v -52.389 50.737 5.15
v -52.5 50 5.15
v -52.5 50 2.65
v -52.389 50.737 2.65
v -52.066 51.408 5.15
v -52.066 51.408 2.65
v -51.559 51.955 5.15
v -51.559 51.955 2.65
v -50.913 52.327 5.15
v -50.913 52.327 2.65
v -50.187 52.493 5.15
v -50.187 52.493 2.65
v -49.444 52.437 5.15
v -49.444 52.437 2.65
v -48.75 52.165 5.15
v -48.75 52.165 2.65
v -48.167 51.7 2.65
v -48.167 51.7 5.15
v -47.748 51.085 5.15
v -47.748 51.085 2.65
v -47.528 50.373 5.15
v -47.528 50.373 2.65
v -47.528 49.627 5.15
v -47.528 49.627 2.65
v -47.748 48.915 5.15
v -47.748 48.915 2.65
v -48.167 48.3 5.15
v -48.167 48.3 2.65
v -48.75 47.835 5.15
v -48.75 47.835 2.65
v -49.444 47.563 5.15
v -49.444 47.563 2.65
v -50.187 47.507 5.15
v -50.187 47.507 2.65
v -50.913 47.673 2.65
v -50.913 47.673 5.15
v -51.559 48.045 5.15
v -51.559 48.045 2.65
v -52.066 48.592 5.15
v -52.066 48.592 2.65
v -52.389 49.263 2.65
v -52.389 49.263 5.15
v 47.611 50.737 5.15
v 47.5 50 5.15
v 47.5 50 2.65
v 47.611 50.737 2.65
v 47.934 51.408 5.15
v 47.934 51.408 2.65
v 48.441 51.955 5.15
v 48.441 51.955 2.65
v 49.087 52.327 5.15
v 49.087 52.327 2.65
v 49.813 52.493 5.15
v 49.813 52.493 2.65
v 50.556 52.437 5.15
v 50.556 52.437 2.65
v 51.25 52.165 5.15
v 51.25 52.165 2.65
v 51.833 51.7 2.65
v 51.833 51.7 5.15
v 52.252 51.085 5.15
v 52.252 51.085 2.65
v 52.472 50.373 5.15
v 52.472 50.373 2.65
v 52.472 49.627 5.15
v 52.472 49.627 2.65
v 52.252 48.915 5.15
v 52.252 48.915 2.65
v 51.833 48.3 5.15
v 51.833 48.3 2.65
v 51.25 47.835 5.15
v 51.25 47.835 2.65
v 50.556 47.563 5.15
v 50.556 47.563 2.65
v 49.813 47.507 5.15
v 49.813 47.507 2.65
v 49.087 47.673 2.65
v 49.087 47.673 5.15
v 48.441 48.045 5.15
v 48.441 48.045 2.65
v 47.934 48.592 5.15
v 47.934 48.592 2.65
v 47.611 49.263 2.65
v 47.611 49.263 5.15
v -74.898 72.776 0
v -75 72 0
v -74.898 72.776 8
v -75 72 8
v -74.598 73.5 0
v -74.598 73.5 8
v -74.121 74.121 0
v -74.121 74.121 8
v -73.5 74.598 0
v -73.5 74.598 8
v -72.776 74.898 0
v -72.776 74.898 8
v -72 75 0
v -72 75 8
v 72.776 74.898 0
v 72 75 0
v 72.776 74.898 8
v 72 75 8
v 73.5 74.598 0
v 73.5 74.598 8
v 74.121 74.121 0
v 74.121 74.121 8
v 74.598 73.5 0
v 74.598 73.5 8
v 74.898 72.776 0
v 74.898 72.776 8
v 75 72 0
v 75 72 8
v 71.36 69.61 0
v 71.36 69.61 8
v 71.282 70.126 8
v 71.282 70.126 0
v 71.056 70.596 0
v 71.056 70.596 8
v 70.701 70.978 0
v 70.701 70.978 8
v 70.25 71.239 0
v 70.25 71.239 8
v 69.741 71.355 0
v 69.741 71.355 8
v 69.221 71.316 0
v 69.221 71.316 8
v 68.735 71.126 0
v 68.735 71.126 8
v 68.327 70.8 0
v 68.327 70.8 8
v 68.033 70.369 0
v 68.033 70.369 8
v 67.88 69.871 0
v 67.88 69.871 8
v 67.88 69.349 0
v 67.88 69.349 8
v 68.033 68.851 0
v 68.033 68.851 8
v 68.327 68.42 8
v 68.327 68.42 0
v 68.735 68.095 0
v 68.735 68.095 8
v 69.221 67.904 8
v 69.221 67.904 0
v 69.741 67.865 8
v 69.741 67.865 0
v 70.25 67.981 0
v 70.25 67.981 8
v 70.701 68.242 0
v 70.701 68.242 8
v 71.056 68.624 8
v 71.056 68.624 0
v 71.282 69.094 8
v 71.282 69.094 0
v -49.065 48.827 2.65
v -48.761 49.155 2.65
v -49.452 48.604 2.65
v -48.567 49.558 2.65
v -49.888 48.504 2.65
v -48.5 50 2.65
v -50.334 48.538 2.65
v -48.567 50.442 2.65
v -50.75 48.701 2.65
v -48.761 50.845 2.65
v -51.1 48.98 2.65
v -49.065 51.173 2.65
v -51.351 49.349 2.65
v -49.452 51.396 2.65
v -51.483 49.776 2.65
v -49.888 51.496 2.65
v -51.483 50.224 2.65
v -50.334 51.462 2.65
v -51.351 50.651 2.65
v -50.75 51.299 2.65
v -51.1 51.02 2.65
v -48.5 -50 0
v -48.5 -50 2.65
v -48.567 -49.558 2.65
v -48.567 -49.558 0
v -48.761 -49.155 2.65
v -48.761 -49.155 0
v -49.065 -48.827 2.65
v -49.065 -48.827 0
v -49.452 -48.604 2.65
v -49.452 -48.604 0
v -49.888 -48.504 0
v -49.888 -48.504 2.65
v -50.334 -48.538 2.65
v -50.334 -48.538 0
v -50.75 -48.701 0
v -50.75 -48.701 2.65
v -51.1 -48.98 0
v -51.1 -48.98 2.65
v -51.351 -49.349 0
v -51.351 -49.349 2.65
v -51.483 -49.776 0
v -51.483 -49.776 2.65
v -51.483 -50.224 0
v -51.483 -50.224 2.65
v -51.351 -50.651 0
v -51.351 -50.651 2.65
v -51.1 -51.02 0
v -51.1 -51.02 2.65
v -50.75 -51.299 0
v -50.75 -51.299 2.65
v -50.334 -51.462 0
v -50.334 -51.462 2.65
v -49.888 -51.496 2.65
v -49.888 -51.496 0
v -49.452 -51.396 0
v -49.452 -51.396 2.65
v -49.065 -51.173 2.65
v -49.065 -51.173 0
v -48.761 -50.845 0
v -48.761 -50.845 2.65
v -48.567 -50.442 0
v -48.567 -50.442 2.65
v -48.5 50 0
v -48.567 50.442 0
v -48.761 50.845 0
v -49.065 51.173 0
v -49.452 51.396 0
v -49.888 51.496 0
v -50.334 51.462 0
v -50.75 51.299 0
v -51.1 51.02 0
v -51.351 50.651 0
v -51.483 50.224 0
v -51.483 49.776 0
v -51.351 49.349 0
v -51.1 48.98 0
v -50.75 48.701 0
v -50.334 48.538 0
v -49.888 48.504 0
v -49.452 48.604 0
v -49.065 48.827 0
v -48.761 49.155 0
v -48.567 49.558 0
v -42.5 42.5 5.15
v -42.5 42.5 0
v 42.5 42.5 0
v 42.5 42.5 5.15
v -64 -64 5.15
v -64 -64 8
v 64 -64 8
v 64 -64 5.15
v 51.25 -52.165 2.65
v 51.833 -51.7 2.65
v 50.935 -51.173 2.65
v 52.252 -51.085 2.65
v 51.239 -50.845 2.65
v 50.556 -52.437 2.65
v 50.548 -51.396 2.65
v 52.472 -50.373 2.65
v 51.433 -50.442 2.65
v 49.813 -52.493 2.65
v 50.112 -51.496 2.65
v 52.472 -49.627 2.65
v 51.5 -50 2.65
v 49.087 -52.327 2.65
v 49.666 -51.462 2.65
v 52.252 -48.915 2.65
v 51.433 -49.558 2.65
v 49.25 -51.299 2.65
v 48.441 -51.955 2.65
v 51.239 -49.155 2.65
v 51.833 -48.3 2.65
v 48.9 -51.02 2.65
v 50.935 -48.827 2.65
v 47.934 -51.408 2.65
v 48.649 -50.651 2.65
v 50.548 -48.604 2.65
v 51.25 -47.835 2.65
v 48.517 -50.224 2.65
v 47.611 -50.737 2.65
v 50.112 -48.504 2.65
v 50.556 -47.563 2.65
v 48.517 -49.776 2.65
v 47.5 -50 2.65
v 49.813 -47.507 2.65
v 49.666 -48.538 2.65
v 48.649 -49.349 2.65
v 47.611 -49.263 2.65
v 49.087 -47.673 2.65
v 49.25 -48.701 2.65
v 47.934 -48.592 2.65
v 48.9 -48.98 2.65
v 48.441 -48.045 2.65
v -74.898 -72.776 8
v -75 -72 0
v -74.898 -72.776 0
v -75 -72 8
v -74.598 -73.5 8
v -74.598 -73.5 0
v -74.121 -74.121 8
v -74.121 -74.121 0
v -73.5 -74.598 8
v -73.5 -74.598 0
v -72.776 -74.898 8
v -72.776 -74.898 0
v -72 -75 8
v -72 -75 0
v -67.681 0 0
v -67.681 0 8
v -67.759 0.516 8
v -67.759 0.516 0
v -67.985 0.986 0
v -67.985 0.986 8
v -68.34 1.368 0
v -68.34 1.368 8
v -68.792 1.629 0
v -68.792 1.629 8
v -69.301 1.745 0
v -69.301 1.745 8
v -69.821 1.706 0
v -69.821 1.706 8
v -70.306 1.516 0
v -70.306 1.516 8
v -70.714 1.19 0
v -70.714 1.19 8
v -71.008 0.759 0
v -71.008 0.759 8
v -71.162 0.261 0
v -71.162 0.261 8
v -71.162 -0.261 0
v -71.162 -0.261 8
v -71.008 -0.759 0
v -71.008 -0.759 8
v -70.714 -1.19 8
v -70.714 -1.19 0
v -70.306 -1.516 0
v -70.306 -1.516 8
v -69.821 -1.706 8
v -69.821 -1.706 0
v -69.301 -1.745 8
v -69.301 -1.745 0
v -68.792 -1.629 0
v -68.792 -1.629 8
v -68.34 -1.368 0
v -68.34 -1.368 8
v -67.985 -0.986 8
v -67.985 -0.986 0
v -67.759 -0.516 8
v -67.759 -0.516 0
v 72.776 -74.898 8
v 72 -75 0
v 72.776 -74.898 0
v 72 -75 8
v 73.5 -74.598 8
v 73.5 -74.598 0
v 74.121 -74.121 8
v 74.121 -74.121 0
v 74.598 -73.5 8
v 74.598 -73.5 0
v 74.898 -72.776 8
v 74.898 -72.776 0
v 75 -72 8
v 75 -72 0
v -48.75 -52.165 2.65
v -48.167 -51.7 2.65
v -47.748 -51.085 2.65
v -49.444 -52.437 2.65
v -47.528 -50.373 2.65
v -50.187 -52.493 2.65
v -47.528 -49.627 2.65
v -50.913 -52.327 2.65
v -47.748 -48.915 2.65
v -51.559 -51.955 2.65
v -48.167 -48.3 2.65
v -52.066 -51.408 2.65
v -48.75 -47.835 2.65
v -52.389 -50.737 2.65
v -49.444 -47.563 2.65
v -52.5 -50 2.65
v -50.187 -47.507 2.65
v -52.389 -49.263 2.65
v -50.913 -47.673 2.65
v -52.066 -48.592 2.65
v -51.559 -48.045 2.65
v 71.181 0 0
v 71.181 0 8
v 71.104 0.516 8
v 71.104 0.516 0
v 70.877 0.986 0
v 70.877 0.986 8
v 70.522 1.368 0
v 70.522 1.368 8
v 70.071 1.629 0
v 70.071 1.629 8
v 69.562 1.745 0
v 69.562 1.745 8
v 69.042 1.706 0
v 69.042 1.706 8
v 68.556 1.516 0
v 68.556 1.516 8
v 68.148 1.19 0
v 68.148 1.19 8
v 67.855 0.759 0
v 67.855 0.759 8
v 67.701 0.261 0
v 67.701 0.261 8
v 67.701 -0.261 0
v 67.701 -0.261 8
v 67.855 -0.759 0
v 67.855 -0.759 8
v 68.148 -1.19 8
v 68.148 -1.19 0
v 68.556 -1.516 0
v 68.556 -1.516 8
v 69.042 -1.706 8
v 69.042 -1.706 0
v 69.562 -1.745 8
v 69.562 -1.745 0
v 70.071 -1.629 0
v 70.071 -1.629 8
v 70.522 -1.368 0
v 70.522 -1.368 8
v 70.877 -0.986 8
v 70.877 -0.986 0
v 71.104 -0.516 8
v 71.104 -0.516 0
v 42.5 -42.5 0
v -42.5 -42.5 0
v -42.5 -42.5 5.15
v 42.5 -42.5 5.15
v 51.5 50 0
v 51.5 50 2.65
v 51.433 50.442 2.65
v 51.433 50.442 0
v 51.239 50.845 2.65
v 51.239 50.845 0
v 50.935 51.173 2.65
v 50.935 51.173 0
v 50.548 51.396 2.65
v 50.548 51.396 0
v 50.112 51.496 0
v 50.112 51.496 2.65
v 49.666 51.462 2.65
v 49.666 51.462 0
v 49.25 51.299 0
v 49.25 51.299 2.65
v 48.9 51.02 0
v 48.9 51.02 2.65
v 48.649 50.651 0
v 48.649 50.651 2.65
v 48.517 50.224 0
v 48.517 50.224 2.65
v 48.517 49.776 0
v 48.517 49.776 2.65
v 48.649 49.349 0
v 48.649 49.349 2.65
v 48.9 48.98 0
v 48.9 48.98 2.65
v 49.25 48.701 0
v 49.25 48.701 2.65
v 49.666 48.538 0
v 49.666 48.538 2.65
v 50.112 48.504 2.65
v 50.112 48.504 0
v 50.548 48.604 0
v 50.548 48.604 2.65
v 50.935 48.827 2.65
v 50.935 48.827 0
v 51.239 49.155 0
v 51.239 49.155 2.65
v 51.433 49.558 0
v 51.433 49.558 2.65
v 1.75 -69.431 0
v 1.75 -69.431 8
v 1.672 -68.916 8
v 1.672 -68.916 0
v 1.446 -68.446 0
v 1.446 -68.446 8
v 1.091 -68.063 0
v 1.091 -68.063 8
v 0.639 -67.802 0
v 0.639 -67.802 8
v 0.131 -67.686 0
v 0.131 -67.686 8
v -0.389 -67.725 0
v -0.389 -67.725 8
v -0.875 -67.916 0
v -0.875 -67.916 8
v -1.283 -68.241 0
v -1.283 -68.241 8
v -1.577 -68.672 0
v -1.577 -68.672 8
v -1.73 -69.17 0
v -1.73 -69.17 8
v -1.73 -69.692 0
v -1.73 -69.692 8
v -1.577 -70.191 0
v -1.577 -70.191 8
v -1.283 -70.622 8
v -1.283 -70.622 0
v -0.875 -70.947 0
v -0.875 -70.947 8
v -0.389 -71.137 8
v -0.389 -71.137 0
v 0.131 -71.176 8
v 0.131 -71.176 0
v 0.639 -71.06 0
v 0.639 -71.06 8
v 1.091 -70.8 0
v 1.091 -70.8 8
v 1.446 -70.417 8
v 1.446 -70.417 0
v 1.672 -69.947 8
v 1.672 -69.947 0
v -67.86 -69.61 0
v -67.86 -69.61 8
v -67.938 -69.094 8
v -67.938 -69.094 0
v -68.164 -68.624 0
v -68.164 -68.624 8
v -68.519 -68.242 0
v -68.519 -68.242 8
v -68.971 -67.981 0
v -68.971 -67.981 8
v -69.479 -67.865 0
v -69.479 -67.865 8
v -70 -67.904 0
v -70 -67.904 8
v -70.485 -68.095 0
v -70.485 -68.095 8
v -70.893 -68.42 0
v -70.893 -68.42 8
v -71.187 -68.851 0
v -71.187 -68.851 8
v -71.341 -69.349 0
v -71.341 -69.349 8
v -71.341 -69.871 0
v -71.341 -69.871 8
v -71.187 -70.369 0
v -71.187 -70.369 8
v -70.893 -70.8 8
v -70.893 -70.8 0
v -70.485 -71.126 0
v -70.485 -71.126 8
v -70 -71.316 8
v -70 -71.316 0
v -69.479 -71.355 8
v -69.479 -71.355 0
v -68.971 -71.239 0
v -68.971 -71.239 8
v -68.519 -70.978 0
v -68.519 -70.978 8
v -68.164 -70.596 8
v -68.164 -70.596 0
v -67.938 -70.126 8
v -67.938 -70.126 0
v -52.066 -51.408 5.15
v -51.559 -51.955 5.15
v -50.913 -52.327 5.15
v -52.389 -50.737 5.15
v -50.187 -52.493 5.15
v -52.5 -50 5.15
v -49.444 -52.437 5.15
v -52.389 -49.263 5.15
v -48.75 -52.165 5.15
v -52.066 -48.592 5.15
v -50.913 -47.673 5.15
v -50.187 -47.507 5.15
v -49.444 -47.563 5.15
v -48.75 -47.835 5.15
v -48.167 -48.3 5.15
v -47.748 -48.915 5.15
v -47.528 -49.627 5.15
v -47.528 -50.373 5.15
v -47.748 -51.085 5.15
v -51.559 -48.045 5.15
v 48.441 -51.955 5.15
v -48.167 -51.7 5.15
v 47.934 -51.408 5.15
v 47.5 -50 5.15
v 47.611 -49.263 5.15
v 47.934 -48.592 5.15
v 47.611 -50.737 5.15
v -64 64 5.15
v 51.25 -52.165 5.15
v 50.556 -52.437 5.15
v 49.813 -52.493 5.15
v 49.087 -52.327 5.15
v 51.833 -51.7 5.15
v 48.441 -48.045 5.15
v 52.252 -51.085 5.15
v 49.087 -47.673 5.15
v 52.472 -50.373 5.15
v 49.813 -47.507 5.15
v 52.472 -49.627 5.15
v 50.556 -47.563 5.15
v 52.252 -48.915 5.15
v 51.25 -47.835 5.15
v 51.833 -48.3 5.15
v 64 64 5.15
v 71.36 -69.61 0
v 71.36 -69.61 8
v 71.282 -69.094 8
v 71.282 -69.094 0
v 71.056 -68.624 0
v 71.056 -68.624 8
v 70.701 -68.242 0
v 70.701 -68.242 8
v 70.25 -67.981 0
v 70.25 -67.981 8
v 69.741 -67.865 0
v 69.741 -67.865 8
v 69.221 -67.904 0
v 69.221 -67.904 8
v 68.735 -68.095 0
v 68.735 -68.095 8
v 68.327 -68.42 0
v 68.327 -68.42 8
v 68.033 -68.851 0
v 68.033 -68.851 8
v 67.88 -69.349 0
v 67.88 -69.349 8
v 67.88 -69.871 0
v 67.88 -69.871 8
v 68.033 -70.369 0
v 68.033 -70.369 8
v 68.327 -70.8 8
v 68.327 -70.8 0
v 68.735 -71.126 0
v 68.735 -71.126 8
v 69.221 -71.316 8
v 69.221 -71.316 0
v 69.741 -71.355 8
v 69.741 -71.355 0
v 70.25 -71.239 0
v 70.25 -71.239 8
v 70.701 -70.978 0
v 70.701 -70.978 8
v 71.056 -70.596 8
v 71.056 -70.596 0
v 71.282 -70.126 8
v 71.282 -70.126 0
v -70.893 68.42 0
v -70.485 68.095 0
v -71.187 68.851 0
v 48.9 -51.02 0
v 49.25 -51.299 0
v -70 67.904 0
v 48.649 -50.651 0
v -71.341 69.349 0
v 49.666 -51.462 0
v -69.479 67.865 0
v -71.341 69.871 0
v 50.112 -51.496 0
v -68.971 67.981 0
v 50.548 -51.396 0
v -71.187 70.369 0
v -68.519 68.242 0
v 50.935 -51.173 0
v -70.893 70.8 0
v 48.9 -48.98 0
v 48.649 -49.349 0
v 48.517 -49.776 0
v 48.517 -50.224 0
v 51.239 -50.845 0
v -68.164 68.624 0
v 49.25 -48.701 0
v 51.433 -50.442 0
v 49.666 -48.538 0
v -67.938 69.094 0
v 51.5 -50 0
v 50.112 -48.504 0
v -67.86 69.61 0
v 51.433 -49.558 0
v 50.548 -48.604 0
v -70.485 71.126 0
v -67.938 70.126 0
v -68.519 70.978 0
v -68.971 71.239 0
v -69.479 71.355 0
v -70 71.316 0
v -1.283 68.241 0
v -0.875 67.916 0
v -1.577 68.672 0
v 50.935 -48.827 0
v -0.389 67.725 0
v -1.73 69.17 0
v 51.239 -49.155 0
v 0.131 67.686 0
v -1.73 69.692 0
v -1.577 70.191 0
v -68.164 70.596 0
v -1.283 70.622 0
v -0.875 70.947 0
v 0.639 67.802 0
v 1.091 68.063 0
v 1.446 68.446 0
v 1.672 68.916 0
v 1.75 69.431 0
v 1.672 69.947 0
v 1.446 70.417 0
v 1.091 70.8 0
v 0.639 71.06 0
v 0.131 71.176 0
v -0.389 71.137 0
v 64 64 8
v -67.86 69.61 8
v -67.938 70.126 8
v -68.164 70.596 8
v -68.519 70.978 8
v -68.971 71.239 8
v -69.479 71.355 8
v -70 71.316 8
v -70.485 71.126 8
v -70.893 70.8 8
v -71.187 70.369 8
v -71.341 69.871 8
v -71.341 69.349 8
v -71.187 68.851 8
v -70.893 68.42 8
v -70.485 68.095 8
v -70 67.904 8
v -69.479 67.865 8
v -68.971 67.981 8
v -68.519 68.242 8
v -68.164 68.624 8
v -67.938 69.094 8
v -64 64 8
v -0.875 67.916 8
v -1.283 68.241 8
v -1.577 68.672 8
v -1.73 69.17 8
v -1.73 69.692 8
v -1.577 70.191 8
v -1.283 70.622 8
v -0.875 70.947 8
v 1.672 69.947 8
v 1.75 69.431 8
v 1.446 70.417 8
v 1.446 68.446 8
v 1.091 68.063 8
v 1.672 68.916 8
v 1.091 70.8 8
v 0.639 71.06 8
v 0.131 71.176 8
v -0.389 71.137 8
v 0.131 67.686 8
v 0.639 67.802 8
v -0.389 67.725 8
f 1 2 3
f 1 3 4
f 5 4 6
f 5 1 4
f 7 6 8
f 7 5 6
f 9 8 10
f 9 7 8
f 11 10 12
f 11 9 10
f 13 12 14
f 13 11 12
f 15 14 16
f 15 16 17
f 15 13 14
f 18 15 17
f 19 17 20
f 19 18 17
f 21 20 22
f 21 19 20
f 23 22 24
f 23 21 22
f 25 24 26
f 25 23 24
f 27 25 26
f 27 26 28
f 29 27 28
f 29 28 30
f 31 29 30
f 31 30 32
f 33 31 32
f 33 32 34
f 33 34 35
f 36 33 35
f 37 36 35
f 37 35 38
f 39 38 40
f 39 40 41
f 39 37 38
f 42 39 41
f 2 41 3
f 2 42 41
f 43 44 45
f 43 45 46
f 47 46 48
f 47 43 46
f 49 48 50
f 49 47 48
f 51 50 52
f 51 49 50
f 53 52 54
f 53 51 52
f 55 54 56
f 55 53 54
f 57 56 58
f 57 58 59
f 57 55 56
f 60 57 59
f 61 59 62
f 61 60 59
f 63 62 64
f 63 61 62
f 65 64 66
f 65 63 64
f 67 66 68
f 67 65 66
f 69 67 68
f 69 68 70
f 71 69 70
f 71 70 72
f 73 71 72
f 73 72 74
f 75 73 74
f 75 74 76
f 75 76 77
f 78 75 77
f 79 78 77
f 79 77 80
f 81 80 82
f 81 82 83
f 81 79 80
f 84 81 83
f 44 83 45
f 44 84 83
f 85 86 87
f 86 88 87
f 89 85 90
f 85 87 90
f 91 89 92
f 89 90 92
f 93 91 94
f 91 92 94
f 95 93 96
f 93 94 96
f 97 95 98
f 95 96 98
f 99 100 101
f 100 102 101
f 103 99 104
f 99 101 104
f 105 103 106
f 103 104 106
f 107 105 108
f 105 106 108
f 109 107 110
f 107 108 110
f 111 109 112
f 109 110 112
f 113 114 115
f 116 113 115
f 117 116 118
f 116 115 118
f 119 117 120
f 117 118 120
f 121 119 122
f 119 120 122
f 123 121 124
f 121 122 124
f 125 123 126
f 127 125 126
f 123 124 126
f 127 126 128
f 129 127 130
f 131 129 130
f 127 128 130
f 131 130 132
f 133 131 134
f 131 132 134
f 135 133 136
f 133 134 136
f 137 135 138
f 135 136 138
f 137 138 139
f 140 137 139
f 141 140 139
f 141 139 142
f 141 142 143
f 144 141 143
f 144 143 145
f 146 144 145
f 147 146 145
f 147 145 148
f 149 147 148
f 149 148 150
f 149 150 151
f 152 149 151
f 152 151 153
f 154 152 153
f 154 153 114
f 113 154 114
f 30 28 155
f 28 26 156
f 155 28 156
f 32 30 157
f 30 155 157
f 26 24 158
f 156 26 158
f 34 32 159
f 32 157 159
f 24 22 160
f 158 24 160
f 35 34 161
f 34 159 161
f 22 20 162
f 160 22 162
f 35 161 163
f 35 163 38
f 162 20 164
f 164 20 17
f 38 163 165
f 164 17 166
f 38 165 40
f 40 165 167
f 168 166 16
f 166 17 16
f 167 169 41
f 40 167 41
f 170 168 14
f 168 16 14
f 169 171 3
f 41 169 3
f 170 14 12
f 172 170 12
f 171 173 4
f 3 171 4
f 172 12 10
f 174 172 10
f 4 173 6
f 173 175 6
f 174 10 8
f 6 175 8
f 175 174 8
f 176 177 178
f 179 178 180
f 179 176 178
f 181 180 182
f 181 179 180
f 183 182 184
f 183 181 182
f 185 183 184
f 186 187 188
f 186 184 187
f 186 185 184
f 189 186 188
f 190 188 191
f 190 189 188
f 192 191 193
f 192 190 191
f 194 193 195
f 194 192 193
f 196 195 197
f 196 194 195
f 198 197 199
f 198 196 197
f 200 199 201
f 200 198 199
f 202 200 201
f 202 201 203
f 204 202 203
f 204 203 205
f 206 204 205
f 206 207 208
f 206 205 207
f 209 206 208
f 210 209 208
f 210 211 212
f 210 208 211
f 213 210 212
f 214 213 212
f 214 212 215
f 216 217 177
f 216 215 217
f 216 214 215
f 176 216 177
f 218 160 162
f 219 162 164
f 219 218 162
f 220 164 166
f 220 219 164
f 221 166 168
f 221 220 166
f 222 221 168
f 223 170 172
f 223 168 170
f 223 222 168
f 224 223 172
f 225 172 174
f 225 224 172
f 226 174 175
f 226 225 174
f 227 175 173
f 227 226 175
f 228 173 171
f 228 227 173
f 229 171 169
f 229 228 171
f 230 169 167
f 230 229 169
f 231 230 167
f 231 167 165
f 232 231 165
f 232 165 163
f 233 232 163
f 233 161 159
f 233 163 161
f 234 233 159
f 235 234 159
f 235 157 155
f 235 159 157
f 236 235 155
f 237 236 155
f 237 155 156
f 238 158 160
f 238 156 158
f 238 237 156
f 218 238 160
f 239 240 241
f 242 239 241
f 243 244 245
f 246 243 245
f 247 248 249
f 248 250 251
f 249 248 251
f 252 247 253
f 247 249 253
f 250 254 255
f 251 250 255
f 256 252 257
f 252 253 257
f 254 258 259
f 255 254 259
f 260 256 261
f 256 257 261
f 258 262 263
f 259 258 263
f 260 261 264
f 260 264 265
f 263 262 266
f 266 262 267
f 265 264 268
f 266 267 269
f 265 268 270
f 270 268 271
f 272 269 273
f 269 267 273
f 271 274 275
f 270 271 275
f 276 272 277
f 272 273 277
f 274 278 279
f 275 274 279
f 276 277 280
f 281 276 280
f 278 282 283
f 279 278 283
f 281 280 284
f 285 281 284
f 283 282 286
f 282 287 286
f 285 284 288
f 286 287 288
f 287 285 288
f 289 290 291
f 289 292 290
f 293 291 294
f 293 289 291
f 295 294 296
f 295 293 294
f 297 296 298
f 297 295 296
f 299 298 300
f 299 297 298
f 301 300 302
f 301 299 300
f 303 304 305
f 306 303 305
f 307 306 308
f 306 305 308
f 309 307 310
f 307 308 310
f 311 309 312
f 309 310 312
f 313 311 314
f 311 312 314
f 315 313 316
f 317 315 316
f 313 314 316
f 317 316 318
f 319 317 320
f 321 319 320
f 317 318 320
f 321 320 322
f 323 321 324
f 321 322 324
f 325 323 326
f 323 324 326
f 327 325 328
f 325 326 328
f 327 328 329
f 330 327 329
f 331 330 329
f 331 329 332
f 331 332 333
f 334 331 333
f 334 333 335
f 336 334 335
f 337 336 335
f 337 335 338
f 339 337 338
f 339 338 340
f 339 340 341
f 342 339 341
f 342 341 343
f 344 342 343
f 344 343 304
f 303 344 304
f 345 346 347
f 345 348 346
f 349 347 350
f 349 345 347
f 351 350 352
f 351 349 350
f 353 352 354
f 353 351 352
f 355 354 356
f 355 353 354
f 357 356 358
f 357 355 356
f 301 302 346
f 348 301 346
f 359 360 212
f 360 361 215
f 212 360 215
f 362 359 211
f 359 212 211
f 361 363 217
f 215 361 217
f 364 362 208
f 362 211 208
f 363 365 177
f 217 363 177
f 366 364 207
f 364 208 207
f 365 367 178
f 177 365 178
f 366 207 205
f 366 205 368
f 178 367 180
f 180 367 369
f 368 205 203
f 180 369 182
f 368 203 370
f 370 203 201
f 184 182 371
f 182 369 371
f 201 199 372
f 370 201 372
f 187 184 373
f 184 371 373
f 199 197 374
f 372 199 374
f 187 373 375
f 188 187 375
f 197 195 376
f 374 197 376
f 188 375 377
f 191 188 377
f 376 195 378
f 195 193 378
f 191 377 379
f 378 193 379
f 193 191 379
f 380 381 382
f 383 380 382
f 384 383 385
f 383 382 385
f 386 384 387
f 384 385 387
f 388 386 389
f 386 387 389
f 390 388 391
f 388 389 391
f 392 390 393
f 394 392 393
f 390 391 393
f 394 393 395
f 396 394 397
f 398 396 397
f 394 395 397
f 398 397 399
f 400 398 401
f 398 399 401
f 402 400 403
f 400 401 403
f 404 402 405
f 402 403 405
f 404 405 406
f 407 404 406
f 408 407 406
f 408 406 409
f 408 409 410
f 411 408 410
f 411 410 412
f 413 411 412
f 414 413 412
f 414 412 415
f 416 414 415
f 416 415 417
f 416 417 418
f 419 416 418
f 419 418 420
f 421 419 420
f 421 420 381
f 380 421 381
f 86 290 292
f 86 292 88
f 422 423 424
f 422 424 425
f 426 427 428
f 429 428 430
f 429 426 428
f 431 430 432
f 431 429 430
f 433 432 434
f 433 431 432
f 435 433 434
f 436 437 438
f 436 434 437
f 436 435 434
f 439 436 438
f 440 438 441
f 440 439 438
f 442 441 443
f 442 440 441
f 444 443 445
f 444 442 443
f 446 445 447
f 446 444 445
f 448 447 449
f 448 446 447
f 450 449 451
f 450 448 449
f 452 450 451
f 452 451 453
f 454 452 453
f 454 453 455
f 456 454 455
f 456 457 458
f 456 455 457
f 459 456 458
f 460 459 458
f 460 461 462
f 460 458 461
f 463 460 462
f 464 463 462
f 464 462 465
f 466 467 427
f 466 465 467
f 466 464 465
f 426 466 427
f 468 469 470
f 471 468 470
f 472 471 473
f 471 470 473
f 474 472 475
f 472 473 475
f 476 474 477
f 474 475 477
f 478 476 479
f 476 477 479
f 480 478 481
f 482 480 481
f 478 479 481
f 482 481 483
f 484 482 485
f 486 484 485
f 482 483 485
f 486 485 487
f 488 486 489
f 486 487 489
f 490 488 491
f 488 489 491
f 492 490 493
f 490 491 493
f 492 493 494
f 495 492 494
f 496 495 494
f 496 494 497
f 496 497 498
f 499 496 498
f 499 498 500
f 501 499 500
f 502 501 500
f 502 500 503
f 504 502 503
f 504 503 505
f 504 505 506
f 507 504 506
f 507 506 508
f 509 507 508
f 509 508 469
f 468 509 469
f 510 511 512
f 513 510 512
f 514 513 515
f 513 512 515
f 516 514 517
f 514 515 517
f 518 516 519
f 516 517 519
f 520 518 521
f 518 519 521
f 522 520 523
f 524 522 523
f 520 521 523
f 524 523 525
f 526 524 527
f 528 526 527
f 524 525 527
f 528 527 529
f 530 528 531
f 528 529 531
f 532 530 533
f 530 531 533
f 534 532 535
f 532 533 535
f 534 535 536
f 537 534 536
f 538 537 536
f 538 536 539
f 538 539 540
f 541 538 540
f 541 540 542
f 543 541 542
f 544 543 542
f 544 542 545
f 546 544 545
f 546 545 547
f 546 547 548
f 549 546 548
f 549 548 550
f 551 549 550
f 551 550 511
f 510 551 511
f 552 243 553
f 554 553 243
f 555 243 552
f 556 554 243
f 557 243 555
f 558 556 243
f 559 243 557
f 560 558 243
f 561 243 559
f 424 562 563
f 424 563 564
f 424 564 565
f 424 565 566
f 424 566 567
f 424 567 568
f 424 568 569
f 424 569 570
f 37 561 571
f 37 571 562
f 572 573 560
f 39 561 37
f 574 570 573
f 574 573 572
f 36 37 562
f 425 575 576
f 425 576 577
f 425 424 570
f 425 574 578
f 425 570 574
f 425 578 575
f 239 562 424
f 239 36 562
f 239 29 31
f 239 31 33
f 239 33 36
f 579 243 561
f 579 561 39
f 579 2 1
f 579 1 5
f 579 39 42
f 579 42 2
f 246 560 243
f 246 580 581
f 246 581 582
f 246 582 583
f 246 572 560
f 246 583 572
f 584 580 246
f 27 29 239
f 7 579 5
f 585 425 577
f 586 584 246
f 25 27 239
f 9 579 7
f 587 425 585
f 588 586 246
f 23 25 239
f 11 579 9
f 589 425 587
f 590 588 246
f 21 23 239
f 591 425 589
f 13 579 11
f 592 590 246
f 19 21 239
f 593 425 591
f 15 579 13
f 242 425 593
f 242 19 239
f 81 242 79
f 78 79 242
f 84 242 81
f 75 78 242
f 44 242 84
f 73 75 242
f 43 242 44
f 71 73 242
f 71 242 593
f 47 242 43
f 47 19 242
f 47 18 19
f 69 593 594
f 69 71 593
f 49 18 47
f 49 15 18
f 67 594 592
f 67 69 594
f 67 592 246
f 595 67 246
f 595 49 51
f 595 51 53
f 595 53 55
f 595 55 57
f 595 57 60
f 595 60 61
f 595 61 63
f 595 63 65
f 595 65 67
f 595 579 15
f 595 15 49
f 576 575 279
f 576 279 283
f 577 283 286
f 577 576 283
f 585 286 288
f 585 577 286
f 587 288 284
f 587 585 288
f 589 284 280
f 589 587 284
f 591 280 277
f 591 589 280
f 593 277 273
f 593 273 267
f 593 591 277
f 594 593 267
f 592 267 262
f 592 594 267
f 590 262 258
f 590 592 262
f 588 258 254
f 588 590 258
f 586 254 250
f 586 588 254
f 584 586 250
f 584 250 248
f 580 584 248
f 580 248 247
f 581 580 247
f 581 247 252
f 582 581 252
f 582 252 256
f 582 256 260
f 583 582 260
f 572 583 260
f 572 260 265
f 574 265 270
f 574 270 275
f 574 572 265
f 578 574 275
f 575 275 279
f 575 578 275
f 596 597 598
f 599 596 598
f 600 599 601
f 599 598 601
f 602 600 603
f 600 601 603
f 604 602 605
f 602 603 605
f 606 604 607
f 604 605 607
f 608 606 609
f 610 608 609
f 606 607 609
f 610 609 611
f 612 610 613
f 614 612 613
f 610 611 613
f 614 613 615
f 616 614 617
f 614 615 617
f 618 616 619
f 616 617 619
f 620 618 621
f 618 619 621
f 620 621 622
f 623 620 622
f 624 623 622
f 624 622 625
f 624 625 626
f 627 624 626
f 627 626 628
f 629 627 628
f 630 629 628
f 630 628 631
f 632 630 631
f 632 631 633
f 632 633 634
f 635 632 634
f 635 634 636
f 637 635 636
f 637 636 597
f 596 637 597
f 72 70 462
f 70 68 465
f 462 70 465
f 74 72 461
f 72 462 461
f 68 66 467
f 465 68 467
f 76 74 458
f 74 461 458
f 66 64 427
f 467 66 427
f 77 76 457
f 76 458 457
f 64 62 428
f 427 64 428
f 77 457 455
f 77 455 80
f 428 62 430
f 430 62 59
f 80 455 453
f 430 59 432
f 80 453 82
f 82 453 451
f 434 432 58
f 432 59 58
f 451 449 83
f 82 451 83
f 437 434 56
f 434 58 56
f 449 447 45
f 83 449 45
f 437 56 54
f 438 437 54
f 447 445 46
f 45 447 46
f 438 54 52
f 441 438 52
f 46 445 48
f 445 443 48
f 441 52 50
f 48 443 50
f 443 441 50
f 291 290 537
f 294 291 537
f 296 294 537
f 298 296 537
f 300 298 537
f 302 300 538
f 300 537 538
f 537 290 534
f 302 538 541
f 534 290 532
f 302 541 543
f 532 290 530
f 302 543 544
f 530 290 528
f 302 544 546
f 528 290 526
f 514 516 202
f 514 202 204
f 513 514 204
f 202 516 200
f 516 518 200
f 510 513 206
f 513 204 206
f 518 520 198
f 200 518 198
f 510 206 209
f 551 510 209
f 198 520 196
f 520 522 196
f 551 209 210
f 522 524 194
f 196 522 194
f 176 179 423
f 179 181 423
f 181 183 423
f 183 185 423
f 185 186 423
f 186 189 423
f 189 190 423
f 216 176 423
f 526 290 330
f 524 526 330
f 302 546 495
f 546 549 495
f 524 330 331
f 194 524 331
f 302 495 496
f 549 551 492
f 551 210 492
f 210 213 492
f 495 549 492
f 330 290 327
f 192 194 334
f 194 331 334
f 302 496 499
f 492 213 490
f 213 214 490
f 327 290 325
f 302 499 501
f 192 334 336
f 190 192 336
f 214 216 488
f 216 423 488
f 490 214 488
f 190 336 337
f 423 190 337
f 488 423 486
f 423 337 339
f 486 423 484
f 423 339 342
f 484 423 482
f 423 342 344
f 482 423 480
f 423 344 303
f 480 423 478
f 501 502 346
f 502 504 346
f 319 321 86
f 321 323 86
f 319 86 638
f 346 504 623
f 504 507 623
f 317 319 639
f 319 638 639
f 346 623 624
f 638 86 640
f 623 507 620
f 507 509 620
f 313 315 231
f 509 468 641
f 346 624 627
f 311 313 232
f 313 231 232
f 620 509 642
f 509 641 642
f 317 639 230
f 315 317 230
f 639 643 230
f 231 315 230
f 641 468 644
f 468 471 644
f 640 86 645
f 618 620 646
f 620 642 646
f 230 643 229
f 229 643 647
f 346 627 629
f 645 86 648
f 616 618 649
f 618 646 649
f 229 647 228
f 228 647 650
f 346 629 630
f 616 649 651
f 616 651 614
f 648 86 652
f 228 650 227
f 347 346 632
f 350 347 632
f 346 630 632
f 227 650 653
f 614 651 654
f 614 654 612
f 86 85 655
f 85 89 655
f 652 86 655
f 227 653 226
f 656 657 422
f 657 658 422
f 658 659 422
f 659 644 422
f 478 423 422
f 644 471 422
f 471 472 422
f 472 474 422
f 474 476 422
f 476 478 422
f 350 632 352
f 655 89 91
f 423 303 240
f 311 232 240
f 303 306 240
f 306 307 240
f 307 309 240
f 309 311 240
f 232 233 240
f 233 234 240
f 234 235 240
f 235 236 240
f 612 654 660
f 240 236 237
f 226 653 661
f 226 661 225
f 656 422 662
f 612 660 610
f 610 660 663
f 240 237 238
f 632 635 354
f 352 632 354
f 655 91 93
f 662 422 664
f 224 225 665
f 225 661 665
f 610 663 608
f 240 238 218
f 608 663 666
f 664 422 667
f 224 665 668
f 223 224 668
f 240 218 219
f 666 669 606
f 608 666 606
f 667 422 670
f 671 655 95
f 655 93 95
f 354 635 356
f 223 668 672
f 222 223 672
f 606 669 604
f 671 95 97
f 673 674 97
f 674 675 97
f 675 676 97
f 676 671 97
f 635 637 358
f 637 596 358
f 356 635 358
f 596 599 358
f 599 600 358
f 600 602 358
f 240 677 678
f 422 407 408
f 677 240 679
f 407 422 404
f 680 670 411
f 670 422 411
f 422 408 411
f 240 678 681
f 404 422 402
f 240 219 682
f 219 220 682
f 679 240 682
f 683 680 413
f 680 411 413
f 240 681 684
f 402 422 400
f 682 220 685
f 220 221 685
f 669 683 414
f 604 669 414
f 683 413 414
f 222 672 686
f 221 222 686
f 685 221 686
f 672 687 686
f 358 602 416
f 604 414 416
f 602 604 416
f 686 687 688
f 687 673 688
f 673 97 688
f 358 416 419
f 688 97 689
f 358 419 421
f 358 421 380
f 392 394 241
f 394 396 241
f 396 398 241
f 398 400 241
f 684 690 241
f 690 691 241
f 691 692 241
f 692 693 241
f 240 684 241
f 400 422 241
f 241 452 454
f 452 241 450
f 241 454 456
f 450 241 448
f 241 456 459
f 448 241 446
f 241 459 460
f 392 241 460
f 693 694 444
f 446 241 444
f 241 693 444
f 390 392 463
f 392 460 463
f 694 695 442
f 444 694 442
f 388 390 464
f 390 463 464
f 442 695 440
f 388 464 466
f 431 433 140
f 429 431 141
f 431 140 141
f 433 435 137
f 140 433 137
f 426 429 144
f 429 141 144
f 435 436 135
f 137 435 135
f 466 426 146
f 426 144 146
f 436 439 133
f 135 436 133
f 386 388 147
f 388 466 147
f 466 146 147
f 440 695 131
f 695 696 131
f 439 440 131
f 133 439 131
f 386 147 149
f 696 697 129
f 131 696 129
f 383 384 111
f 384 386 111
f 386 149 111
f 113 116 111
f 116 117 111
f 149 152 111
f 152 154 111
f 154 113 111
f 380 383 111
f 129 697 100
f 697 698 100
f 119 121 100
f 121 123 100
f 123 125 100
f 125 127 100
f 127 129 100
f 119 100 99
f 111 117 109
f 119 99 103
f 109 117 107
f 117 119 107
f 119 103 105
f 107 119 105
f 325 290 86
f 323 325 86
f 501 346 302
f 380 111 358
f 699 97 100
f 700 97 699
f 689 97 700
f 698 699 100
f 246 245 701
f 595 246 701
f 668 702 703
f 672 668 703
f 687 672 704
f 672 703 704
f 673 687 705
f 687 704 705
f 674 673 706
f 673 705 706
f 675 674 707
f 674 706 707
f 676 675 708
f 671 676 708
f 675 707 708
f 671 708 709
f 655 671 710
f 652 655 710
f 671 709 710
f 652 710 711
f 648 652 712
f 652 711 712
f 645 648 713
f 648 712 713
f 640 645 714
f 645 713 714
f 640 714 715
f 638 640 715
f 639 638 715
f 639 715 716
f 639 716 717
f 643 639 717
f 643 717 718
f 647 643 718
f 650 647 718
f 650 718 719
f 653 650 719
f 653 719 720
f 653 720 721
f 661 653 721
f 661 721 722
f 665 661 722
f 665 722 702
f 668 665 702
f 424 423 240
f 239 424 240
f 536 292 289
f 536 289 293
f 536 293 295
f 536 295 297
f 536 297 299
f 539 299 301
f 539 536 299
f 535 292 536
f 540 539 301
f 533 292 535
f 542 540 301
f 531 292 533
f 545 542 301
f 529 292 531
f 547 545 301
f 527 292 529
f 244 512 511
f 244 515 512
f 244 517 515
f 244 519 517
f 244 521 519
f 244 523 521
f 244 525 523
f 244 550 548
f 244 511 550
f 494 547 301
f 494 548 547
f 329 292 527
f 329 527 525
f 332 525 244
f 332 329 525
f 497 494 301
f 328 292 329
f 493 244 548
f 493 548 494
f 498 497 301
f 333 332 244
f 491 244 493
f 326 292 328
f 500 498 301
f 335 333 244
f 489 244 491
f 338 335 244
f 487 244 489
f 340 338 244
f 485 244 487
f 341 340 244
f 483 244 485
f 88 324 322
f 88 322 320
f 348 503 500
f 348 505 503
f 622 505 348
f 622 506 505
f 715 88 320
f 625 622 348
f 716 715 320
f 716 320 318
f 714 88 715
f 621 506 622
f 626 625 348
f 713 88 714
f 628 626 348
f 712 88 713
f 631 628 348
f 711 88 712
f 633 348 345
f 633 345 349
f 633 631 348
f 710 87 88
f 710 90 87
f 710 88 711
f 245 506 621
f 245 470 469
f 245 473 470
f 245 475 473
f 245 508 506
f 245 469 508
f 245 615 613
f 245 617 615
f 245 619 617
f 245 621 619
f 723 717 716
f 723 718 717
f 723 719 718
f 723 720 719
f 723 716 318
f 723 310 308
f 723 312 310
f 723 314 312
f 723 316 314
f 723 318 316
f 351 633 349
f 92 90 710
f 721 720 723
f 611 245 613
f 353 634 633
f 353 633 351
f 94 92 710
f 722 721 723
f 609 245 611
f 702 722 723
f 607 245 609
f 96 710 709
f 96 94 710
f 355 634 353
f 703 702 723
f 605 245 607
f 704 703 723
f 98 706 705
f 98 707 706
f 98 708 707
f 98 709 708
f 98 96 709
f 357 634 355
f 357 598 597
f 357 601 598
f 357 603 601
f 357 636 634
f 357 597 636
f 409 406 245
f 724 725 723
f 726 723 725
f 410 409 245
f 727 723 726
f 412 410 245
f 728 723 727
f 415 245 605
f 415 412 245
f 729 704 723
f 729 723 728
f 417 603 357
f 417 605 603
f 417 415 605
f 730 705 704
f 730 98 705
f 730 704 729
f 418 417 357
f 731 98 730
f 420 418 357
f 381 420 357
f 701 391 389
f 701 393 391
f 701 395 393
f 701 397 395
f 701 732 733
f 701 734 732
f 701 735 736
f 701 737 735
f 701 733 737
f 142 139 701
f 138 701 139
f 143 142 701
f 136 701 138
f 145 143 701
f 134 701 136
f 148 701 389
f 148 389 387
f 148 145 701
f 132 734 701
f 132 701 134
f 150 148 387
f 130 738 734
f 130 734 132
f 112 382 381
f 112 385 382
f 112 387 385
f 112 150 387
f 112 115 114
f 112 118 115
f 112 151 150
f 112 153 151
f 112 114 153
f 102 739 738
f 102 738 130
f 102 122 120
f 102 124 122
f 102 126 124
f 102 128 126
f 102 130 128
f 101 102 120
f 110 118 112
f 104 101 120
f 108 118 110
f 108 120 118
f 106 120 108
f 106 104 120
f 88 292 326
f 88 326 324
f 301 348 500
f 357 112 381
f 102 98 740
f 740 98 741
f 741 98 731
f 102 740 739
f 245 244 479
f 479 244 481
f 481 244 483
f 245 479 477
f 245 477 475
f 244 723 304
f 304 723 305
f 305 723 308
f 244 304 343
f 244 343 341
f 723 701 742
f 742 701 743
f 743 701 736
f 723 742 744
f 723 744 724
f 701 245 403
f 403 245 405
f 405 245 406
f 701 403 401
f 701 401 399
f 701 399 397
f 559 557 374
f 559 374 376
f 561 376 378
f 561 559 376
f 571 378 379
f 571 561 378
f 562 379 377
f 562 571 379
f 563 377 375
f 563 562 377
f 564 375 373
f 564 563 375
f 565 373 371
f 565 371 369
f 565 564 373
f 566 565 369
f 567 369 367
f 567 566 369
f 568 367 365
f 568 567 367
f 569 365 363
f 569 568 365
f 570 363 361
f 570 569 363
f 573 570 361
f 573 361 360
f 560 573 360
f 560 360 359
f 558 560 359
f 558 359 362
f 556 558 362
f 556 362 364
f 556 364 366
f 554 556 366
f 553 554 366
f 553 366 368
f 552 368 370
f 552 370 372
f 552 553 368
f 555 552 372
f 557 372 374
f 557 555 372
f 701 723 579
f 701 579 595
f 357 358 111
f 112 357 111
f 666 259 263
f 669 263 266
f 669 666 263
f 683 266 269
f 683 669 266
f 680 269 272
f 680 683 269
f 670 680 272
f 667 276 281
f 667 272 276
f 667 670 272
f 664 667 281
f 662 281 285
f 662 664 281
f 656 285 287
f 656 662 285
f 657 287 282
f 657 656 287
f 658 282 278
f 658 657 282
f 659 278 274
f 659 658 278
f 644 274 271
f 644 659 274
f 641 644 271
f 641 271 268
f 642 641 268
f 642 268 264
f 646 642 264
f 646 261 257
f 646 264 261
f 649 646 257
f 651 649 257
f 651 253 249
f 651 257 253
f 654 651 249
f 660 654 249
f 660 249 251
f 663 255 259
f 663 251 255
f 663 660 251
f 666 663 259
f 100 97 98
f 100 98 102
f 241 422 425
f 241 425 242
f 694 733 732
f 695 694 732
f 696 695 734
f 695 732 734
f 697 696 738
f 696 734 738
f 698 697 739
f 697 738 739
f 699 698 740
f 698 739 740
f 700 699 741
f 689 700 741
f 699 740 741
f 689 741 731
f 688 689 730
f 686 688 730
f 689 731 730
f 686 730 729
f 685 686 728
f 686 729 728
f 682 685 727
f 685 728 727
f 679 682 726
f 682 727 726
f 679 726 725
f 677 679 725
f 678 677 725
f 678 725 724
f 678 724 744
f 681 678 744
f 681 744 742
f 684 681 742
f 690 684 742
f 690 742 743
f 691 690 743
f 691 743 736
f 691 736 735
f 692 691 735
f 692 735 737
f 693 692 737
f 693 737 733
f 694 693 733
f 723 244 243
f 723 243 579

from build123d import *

# Parameters (mm, degrees)
SKETCH1_W           = 150
SKETCH1_H           = 150
SKETCH1_R           = 1.5
SKETCH1_W_2         = 85
SKETCH1_H_2         = 85
BOSS_EXTRUDE1_DEPTH = 8
SKETCH3_W           = 128
SKETCH3_H           = 128
CUT_EXTRUDE2_DEPTH  = 2.85
FILLET1_R           = 3
SKETCH4_R           = 2.5
CUT_EXTRUDE3_DEPTH  = 2.5
SKETCH5_R           = 1.75
CUT_EXTRUDE4_DEPTH  = 23


with BuildPart() as part:
    # Sketch1 → Boss-Extrude1 (new body)
    with BuildSketch(Plane.XY):
        Rectangle(SKETCH1_W, SKETCH1_H)
        with Locations((-50, 50)):
            Circle(SKETCH1_R, mode=Mode.SUBTRACT)
        with Locations((50, 50)):
            Circle(SKETCH1_R, mode=Mode.SUBTRACT)
        with Locations((50, -50)):
            Circle(SKETCH1_R, mode=Mode.SUBTRACT)
        with Locations((-50, -50)):
            Circle(SKETCH1_R, mode=Mode.SUBTRACT)
        Rectangle(SKETCH1_W_2, SKETCH1_H_2, mode=Mode.SUBTRACT)
    extrude(amount=BOSS_EXTRUDE1_DEPTH)

    # Sketch3 → Cut-Extrude2 (cut)
    with BuildSketch(Plane.XY.offset(8)):
        Rectangle(SKETCH3_W, SKETCH3_H)
    extrude(amount=-CUT_EXTRUDE2_DEPTH, mode=Mode.SUBTRACT)

    # Fillet1
    fillet1_edges = [part.edges().sort_by_distance(p)[0] for p in [
        (75, -75, 4),
        (-75, -75, 4),
        (-75, 75, 4),
        (75, 75, 4),
    ]]
    fillet(fillet1_edges, radius=FILLET1_R)

    # Sketch4 → Cut-Extrude3 (cut)
    with BuildSketch(Plane(origin=(0, 0, 5.15), x_dir=(-1, 0, 0), z_dir=(0, 0, -1))):
        with Locations((-50, 50)):
            Circle(SKETCH4_R)
        with Locations((50, 50)):
            Circle(SKETCH4_R)
        with Locations((50, -50)):
            Circle(SKETCH4_R)
        with Locations((-50, -50)):
            Circle(SKETCH4_R)
    extrude(amount=CUT_EXTRUDE3_DEPTH, mode=Mode.SUBTRACT)

    # Sketch5 → Cut-Extrude4 (cut)
    with BuildSketch(Plane.XY.offset(8)):
        with Locations((0, 69.431322576)):
            Circle(SKETCH5_R)
        with Locations((-69.610191061, 69.610191061)):
            Circle(SKETCH5_R)
        with Locations((69.431322576, 0)):
            Circle(SKETCH5_R)
        with Locations((69.610191061, 69.610191061)):
            Circle(SKETCH5_R)
        with Locations((0, -69.431322576)):
            Circle(SKETCH5_R)
        with Locations((69.610191061, -69.610191061)):
            Circle(SKETCH5_R)
        with Locations((-69.431322576, 0)):
            Circle(SKETCH5_R)
        with Locations((-69.610191061, -69.610191061)):
            Circle(SKETCH5_R)
    extrude(amount=-CUT_EXTRUDE4_DEPTH, mode=Mode.SUBTRACT)


solid = part.part
